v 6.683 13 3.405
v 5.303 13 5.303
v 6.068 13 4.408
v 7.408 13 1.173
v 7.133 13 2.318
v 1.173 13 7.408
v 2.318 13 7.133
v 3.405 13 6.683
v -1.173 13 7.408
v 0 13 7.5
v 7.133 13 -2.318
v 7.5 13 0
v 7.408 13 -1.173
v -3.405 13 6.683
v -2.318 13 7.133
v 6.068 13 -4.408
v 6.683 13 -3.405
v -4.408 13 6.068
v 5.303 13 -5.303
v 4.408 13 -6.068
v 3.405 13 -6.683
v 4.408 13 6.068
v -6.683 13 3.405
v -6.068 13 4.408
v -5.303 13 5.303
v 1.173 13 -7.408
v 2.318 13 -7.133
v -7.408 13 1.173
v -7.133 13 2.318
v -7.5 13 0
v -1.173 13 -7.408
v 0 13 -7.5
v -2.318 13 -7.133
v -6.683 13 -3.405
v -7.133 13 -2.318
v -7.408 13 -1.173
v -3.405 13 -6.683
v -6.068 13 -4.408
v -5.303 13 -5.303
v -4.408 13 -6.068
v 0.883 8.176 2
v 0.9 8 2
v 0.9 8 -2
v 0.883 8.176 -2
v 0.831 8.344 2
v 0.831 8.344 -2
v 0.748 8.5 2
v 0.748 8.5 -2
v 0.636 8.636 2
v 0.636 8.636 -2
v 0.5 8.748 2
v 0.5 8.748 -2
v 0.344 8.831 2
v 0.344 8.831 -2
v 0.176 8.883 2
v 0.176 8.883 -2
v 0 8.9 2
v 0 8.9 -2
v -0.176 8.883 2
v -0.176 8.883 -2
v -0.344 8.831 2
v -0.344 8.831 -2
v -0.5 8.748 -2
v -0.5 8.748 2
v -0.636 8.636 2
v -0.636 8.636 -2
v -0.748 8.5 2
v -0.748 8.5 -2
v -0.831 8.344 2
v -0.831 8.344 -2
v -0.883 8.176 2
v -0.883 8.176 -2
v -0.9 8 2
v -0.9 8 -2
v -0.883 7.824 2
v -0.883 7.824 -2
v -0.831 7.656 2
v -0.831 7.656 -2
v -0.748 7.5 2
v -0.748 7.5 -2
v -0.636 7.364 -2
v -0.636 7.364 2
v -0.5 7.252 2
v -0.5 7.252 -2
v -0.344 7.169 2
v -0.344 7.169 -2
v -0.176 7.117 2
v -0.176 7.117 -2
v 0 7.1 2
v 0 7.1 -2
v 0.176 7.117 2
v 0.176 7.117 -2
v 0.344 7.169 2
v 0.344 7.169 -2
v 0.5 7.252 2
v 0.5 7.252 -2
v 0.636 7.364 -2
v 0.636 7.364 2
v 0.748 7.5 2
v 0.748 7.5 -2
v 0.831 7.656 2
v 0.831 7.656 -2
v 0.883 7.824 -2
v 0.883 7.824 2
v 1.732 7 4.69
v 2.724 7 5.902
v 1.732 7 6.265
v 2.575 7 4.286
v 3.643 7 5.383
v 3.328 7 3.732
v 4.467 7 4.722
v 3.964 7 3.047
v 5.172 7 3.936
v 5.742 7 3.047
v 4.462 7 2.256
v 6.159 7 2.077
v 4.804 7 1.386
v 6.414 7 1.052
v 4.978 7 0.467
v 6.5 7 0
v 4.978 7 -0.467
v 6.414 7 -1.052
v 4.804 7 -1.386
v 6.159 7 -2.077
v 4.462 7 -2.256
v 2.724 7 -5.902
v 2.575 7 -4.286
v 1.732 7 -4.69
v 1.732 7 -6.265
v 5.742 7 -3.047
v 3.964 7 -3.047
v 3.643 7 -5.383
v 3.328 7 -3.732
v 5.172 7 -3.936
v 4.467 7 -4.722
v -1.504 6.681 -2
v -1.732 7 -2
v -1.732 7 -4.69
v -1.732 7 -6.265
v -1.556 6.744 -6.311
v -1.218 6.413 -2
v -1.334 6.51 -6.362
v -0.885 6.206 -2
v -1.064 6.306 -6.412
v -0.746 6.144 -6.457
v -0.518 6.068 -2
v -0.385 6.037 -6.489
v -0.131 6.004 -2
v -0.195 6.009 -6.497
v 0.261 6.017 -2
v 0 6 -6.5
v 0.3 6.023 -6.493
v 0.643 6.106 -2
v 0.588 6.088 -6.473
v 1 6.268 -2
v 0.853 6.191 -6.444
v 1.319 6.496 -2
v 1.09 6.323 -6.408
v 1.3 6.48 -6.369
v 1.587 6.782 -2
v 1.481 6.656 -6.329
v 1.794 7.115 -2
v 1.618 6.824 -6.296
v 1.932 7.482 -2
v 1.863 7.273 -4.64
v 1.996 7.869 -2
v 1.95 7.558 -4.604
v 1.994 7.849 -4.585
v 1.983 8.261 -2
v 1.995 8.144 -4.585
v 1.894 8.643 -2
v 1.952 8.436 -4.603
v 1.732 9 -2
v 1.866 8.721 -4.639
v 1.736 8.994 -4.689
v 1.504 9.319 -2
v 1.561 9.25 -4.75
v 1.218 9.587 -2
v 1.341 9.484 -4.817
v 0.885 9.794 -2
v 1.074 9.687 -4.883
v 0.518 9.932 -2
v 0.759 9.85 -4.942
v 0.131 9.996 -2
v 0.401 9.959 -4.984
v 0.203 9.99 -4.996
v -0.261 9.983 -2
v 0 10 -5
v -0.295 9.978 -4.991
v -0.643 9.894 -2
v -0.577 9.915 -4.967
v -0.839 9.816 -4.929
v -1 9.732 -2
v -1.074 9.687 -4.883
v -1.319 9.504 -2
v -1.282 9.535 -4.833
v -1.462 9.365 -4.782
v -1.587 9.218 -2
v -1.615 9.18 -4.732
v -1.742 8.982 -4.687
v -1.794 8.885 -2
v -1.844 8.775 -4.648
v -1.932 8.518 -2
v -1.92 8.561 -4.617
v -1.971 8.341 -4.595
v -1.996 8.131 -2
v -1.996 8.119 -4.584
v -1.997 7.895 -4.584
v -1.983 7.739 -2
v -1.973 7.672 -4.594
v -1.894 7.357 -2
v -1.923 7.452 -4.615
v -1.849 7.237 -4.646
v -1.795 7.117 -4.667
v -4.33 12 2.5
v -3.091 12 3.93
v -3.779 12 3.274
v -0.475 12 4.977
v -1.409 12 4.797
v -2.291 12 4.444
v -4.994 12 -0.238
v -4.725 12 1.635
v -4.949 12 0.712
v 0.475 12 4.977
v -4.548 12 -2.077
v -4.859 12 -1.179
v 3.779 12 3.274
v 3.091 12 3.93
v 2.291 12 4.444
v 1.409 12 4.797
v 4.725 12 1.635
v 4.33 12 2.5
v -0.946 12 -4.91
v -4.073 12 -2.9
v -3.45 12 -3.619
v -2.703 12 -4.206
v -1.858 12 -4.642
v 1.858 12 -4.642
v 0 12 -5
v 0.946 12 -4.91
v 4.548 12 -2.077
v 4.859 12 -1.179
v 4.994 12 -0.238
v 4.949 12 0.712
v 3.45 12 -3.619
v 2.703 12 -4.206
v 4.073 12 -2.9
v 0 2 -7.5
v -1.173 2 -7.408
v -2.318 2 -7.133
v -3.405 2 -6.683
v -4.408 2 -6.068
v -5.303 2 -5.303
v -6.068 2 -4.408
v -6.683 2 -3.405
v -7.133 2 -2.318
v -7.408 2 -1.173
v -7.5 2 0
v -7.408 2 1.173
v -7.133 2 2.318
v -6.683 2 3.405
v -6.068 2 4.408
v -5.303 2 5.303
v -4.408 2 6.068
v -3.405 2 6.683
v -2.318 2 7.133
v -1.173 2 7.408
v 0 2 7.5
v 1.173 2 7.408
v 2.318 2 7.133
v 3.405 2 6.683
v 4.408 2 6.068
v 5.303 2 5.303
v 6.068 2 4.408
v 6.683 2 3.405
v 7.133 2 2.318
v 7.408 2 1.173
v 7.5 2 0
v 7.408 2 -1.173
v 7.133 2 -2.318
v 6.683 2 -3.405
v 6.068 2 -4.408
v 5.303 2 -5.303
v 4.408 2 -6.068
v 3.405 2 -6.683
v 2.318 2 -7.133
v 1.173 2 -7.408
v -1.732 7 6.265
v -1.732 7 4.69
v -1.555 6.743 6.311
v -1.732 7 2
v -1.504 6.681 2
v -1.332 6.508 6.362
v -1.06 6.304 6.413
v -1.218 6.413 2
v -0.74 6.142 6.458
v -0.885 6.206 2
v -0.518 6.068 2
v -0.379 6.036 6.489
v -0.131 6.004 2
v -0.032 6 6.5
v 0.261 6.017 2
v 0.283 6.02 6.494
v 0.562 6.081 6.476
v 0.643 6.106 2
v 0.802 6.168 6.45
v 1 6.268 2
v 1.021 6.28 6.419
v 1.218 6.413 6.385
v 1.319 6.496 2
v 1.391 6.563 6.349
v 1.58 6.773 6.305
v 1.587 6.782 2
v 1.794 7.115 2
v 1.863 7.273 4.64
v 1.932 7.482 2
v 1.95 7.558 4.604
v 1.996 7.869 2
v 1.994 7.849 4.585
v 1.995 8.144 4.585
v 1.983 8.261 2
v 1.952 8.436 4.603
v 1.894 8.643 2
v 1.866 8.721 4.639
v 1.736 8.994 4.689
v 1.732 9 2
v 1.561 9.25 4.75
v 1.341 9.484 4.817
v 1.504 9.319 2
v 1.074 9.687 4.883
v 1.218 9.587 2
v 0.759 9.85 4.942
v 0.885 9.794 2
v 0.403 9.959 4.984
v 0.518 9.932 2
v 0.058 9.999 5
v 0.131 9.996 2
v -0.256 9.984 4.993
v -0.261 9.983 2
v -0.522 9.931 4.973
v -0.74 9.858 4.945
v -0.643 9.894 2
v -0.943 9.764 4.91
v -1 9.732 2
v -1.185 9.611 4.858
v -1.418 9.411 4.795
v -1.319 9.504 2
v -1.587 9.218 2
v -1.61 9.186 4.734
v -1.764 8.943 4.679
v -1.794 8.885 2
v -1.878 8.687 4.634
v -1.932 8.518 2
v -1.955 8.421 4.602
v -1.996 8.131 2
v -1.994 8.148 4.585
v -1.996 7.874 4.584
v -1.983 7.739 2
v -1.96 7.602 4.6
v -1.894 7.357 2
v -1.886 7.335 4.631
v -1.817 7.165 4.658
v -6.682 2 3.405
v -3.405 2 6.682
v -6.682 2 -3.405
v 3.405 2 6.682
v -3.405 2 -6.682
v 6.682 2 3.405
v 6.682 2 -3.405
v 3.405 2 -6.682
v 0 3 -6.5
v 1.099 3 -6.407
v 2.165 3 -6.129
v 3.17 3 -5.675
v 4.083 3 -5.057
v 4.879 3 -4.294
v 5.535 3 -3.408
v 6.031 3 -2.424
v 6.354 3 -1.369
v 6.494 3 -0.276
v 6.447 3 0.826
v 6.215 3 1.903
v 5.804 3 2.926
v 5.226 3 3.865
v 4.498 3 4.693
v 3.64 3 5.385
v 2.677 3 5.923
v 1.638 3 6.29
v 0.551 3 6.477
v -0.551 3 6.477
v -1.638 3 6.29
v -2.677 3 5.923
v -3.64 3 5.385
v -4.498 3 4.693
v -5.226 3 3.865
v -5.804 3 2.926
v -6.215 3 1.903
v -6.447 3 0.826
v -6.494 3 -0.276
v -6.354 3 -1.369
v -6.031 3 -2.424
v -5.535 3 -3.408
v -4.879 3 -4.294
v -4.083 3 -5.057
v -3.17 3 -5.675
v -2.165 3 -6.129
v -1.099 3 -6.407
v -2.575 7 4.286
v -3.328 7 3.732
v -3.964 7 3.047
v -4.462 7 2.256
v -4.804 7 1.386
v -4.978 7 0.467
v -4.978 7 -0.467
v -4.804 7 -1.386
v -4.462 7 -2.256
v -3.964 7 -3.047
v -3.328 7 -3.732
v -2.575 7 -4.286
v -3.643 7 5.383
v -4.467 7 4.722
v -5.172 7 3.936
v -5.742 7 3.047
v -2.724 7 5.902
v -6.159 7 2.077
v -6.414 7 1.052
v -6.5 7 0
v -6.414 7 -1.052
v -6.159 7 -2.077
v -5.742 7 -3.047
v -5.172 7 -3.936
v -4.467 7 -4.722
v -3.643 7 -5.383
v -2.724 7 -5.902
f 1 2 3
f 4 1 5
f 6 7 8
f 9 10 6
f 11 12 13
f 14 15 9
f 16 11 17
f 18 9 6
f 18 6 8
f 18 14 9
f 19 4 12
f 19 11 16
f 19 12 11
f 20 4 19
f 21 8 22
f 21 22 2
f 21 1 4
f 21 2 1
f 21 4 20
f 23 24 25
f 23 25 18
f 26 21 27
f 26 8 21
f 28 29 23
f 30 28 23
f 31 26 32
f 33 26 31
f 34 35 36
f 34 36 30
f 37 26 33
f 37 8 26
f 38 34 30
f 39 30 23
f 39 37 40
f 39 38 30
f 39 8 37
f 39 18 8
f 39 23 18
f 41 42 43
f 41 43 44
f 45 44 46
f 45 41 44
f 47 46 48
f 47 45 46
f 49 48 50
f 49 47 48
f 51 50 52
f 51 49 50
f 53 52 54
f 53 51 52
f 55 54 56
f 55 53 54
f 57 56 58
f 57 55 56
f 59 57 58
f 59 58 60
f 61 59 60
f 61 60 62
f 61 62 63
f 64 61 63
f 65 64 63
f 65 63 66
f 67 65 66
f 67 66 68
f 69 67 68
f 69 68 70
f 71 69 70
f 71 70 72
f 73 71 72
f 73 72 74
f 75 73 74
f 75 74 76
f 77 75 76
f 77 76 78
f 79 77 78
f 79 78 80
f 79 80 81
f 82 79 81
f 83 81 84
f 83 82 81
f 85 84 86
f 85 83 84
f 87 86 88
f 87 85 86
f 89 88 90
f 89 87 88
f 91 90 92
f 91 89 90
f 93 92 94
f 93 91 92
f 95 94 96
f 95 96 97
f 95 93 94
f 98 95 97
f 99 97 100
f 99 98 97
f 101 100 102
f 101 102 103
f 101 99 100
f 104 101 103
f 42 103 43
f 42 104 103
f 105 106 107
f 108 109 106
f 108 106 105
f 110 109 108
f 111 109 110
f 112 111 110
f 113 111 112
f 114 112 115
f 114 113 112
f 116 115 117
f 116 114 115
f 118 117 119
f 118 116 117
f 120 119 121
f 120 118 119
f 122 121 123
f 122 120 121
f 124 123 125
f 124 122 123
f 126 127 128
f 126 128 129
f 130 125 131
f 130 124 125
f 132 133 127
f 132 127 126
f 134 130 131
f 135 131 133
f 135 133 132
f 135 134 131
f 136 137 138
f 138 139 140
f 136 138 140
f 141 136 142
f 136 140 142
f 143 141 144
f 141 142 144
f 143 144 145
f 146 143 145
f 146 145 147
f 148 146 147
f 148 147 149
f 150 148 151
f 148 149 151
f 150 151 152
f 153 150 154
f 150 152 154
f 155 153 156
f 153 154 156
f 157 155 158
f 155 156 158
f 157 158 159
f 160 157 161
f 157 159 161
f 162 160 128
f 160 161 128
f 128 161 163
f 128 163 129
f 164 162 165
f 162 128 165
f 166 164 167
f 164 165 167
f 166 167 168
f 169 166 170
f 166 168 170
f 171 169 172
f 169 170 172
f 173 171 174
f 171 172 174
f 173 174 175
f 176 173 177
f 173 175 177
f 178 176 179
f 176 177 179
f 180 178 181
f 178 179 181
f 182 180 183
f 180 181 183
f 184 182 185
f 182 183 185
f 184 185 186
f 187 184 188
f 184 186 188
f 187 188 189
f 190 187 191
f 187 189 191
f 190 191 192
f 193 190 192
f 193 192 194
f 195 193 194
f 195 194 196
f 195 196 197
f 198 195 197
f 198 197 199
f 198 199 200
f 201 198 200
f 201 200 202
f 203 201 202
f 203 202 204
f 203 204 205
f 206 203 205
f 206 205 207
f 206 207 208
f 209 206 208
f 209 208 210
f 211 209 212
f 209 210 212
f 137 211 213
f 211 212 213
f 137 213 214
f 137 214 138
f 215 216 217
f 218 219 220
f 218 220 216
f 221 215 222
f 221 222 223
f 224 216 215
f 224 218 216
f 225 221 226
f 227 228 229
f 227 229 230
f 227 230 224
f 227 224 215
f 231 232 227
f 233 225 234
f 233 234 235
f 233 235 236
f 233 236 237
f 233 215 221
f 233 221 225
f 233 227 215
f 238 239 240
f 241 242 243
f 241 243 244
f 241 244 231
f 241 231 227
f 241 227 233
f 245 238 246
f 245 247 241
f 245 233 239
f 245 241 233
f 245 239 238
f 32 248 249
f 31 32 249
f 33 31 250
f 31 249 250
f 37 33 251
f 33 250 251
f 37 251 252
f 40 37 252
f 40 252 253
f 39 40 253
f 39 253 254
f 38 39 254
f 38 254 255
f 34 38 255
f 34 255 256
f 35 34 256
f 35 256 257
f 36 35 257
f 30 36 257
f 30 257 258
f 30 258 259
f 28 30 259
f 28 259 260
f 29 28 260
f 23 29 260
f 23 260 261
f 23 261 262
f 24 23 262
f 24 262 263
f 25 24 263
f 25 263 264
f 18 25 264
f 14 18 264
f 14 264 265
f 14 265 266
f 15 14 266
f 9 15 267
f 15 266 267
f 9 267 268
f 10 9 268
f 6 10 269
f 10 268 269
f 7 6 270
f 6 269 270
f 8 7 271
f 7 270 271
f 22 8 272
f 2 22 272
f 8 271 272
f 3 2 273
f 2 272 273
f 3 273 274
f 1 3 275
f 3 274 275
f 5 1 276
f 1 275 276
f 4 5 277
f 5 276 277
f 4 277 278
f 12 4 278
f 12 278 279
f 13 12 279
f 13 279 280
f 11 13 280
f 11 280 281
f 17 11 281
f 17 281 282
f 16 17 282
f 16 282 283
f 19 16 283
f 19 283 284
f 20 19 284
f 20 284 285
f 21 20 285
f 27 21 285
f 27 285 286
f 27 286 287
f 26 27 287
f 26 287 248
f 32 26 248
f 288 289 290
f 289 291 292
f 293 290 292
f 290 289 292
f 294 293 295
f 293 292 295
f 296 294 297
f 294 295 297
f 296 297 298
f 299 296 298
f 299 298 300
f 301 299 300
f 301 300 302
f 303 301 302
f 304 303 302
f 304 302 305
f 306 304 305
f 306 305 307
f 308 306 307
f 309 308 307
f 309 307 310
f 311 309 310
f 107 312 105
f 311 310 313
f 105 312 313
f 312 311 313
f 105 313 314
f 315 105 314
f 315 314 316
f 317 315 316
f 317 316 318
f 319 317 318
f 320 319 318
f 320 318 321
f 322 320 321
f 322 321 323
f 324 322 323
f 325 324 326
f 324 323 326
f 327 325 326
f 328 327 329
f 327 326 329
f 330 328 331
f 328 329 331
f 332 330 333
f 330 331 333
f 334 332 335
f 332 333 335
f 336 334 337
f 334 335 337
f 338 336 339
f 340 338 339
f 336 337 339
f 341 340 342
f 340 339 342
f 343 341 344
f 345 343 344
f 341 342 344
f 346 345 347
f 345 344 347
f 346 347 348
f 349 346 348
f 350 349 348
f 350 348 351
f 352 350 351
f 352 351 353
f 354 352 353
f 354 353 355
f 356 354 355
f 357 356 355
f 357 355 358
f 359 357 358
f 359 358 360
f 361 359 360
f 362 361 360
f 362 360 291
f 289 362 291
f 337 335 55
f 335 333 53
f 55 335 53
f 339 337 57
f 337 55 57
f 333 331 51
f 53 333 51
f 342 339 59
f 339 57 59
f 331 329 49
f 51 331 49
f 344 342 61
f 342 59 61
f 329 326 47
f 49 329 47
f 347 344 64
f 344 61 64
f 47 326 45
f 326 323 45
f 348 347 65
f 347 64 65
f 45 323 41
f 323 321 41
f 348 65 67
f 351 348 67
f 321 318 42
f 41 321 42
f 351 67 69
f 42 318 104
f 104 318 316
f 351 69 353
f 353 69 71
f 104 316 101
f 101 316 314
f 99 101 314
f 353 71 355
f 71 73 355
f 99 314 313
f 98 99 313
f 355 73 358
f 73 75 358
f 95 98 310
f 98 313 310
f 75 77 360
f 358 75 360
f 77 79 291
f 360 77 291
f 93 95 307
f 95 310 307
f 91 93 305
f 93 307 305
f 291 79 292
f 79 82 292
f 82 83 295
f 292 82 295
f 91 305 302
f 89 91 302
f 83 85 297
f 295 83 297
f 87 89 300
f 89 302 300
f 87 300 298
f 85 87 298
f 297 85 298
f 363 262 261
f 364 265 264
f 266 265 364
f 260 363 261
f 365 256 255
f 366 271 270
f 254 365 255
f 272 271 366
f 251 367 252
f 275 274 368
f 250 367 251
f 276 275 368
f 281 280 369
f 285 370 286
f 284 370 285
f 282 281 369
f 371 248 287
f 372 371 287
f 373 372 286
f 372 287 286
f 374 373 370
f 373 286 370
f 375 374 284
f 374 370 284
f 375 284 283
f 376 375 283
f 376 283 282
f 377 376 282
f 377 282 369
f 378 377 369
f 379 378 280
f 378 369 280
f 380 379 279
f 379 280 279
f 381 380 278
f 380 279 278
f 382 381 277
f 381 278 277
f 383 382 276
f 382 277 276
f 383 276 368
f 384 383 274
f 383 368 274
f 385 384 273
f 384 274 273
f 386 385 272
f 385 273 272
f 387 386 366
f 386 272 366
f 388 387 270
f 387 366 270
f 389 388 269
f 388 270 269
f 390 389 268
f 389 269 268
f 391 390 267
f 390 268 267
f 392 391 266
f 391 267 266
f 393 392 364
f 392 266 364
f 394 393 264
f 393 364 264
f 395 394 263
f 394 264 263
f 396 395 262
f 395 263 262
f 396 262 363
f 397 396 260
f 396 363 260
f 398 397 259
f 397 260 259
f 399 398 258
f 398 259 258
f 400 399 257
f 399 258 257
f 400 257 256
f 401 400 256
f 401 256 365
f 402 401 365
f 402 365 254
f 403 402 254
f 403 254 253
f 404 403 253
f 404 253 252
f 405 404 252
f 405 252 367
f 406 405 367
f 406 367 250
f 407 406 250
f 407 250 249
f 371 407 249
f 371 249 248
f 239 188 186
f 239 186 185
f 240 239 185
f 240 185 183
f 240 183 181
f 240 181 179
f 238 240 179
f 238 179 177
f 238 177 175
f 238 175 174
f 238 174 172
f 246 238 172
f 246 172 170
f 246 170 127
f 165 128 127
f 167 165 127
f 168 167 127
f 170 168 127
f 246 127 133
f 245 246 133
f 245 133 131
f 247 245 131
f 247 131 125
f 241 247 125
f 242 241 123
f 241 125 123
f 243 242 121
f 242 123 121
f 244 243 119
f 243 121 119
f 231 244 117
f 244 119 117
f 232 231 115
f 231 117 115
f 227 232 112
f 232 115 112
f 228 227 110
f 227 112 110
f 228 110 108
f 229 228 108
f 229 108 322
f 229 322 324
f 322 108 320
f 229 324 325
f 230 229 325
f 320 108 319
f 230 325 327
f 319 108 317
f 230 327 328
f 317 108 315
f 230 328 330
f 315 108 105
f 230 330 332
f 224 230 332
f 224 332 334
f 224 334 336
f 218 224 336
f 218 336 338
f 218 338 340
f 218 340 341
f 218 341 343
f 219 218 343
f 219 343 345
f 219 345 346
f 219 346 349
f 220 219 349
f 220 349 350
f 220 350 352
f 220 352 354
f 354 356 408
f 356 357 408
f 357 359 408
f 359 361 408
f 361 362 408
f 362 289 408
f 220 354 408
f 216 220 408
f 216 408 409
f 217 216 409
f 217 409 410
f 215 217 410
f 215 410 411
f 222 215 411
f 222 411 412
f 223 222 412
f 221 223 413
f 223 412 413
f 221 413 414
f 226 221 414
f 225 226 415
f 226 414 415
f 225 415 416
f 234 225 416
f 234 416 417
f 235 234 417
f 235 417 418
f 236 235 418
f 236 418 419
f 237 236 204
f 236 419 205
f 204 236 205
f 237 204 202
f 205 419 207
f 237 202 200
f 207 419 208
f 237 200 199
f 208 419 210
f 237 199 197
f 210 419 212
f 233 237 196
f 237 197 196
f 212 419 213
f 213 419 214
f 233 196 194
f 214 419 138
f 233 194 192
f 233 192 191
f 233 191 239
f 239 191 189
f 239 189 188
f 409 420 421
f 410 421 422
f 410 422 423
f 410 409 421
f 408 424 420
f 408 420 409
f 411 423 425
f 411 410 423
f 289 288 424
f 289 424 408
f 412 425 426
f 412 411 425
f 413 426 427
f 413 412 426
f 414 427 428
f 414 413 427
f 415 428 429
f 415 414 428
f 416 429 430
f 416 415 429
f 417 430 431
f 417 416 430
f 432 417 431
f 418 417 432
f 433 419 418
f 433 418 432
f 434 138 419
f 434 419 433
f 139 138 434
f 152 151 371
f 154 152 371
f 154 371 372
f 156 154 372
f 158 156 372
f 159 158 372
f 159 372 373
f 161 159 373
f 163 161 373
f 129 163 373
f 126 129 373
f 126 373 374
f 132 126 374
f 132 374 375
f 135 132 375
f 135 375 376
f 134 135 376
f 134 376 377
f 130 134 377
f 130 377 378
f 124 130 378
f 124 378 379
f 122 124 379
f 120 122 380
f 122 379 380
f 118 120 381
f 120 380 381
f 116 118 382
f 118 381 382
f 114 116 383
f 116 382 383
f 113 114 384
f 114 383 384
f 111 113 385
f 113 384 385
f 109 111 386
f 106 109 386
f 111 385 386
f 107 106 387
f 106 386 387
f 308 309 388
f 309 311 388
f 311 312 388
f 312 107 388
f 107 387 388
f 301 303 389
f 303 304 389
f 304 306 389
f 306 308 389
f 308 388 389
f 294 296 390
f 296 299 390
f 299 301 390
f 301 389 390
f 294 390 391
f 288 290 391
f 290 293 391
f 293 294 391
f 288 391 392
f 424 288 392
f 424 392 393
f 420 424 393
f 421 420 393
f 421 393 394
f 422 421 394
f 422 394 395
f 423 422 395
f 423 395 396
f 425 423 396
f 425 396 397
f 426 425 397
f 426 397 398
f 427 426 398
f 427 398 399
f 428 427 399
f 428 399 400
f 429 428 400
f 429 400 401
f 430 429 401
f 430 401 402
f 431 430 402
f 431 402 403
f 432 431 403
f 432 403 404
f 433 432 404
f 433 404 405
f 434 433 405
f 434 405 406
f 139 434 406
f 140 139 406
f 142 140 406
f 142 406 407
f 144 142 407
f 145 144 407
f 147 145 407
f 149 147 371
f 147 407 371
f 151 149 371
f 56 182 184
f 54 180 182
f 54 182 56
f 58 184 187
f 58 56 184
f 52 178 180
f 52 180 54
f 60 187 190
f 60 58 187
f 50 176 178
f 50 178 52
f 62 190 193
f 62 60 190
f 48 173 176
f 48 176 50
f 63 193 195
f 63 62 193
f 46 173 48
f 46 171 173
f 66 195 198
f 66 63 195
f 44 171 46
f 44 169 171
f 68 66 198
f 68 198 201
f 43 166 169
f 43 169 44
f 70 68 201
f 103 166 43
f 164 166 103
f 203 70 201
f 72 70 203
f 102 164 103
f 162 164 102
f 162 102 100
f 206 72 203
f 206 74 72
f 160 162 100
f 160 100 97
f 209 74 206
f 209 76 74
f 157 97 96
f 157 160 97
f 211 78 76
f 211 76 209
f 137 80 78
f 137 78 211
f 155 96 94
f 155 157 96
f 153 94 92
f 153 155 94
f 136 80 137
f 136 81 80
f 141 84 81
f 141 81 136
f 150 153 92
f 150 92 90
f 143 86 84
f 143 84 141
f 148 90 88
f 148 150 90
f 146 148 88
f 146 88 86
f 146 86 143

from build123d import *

# Parameters (mm, degrees)
SKETCH1_R           = 7.5
BOSS_EXTRUDE1_DEPTH = 13
SKETCH2_R           = 6.5
CUT_EXTRUDE1_DEPTH  = 7
SKETCH3_W           = 8
SKETCH3_H           = 5
CUT_EXTRUDE2_DEPTH  = 5
SKETCH5_R           = 5
CUT_EXTRUDE5_DEPTH  = 5
SKETCH7_R           = 0.9
BOSS_EXTRUDE4_DEPTH = 14
SKETCH10_R          = 2
BOSS_EXTRUDE5_DEPTH = 5
BOSS_EXTRUDE6_START = -5
SKETCH11_R          = 2
BOSS_EXTRUDE6_DEPTH = 5
SKETCH13_R          = 7.5
CUT_EXTRUDE6_DEPTH  = 2
CHAMFER1_SIZE       = 1


with BuildPart() as part:
    # Sketch1 → Boss-Extrude1 (new body)
    with BuildSketch(Plane(origin=(0, 0, 0), x_dir=(1, 0, 0), z_dir=(0, 1, 0))):
        with Locations(Location((0, 0, 0), (0, 0, 90))):
            Circle(SKETCH1_R)
    extrude(amount=BOSS_EXTRUDE1_DEPTH)

    # Sketch2 → Cut-Extrude1 (cut)
    with BuildSketch(Plane.XZ):
        with Locations(Location((0, 0, 0), (0, 0, 270))):
            Circle(SKETCH2_R)
    extrude(amount=-CUT_EXTRUDE1_DEPTH, mode=Mode.SUBTRACT)

    # Sketch3 → Cut-Extrude2 (cut)
    with BuildSketch(Plane.XZ.offset(-7)):
        Rectangle(SKETCH3_W, SKETCH3_H)
    extrude(amount=-CUT_EXTRUDE2_DEPTH, mode=Mode.SUBTRACT)

    # Sketch5 → Cut-Extrude5 (cut)
    with BuildSketch(Plane.XZ.offset(-7)):
        with Locations(Location((0, 0, 0), (0, 0, 270))):
            Circle(SKETCH5_R)
    extrude(amount=-CUT_EXTRUDE5_DEPTH, mode=Mode.SUBTRACT)

    # Sketch7 → Boss-Extrude4 (add)
    with BuildSketch(Plane.XY.offset(7)):
        with Locations((0, 8)):
            Circle(SKETCH7_R)
    extrude(amount=-BOSS_EXTRUDE4_DEPTH)

    # Sketch10 → Boss-Extrude5 (add)
    with BuildSketch(Plane.XY.offset(2)):
        with Locations(Location((0, 8, 0), (0, 0, 209.999999411))):
            Circle(SKETCH10_R)
    extrude(amount=BOSS_EXTRUDE5_DEPTH)

    # Sketch11 → Boss-Extrude6 (add)
    with BuildSketch(Plane.XY.offset(-2).offset(BOSS_EXTRUDE6_START)):
        with Locations(Location((0, 8, 0), (0, 0, 209.999999411))):
            Circle(SKETCH11_R)
    extrude(amount=BOSS_EXTRUDE6_DEPTH)

    # Sketch13 → Cut-Extrude6 (cut)
    with BuildSketch(Plane.XZ):
        with Locations(Location((0, 0, 0), (0, 0, 270))):
            Circle(SKETCH13_R)
    extrude(amount=-CUT_EXTRUDE6_DEPTH, mode=Mode.SUBTRACT)

    # Chamfer1
    chamfer1_edges = [part.edges().sort_by_distance(p)[0] for p in [
        (0, 2, 6.5),
    ]]
    chamfer(chamfer1_edges, length=CHAMFER1_SIZE - 0.0001)  # a hair under: the kernel refuses the full size


solid = part.part
